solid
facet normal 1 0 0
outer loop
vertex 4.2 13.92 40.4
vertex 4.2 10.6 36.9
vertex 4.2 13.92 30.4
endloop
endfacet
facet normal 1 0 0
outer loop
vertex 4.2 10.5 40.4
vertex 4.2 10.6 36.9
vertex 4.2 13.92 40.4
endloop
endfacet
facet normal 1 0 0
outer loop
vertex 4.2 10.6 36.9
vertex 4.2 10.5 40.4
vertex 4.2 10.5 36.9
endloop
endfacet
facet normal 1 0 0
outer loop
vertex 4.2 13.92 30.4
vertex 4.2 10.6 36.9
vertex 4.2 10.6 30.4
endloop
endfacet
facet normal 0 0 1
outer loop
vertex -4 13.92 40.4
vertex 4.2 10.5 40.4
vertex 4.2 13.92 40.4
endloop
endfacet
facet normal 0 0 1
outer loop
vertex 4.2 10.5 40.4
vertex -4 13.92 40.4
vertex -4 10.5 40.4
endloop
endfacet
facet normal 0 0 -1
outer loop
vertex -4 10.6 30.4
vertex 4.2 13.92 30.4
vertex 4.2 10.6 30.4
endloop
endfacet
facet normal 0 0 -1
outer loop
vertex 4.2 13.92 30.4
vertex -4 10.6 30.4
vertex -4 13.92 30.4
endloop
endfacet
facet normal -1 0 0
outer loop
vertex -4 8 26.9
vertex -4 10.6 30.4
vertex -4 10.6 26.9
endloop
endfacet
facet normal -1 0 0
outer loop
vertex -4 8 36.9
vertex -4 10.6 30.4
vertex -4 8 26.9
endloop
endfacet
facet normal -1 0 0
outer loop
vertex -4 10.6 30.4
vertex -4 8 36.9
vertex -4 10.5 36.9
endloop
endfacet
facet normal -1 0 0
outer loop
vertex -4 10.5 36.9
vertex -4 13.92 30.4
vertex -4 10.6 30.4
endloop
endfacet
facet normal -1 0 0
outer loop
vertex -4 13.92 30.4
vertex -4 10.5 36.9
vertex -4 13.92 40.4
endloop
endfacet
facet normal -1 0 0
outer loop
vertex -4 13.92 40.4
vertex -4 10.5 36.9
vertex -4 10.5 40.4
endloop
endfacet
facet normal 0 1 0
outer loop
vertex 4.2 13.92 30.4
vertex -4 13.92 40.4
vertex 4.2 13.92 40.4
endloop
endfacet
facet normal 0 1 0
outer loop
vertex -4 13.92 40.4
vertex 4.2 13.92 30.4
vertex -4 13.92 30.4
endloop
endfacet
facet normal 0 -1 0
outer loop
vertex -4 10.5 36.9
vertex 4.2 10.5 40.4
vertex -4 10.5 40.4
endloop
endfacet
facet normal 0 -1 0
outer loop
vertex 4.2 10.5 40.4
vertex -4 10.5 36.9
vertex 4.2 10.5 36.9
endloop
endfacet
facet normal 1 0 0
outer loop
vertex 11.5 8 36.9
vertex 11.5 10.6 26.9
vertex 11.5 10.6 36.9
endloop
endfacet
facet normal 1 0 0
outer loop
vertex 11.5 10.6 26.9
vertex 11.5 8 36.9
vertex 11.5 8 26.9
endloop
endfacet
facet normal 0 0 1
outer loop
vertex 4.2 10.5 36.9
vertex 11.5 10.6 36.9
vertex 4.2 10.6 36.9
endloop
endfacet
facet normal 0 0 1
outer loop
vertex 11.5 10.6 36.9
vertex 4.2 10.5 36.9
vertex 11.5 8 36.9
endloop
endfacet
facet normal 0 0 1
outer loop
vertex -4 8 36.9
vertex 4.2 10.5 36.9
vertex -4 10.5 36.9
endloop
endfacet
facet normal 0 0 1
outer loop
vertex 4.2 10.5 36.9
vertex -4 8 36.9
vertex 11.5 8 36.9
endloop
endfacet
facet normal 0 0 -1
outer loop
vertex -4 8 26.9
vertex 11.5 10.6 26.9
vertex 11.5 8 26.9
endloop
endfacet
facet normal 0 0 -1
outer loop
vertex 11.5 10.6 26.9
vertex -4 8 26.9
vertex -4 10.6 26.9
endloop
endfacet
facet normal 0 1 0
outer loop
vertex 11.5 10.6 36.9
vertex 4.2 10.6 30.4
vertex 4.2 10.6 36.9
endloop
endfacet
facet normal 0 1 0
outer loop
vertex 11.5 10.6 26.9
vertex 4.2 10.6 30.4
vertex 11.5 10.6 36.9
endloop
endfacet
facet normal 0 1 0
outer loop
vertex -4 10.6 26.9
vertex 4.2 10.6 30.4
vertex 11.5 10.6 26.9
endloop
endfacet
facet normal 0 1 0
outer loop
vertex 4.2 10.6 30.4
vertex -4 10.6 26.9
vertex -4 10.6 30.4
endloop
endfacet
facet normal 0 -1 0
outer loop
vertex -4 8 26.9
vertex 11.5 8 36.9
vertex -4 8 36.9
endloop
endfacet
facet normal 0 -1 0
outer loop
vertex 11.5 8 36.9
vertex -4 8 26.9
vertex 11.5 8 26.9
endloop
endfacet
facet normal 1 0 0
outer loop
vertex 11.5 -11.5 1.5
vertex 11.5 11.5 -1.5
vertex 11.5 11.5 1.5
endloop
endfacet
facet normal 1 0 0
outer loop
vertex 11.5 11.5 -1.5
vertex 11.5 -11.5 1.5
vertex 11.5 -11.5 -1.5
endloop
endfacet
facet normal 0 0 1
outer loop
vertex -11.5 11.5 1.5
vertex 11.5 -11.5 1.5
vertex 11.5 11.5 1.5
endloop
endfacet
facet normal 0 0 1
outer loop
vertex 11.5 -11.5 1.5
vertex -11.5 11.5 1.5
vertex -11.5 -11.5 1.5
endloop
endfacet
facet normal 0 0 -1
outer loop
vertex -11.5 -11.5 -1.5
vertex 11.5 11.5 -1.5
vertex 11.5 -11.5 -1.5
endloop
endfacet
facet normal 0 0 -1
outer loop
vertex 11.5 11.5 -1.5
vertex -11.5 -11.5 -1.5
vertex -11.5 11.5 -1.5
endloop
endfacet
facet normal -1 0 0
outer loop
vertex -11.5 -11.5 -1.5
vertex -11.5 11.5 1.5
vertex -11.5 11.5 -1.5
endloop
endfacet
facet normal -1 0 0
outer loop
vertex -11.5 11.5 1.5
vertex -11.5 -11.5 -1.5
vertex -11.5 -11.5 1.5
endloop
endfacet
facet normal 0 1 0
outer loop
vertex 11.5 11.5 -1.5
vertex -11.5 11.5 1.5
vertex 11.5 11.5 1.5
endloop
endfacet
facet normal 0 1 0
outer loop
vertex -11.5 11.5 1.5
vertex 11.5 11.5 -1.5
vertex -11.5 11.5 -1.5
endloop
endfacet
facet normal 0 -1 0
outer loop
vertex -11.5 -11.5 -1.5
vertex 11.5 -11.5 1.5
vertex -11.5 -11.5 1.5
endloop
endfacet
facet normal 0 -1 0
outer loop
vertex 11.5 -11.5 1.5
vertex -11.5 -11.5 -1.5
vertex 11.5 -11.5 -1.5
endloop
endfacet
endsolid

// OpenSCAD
// file: ../pro-trinket-faceplate.scad
module proTrinketFacePlate(xLength = 23,
                            yLength = 23,
                            zLength = 3)
{
//    difference()
    {
        cube(center = true,
             size = [xLength, yLength, zLength]);

        trinketCutout();
    }
}


module trinketCutout()
{
    zLength = 10;

    union()
    {
        trinketUsbCutout(zLength = zLength);

        trinketPcbCutout(zLength = zLength);
    }
}


module trinketPcbCutout(zLength)
{
    color("purple")
    translate([-4, 8, 26.9])
    cube(size = [15.5, 2.6, zLength]);
}


module trinketUsbCutout(zLength)
{
    color("pink")
    // color("purple")
    translate([-4, 10.5, 30.4])
    cube(size = [8.2, 3.42, zLength]);
}
// main file
use <../pro-trinket-faceplate.scad>

proTrinketFacePlate();
